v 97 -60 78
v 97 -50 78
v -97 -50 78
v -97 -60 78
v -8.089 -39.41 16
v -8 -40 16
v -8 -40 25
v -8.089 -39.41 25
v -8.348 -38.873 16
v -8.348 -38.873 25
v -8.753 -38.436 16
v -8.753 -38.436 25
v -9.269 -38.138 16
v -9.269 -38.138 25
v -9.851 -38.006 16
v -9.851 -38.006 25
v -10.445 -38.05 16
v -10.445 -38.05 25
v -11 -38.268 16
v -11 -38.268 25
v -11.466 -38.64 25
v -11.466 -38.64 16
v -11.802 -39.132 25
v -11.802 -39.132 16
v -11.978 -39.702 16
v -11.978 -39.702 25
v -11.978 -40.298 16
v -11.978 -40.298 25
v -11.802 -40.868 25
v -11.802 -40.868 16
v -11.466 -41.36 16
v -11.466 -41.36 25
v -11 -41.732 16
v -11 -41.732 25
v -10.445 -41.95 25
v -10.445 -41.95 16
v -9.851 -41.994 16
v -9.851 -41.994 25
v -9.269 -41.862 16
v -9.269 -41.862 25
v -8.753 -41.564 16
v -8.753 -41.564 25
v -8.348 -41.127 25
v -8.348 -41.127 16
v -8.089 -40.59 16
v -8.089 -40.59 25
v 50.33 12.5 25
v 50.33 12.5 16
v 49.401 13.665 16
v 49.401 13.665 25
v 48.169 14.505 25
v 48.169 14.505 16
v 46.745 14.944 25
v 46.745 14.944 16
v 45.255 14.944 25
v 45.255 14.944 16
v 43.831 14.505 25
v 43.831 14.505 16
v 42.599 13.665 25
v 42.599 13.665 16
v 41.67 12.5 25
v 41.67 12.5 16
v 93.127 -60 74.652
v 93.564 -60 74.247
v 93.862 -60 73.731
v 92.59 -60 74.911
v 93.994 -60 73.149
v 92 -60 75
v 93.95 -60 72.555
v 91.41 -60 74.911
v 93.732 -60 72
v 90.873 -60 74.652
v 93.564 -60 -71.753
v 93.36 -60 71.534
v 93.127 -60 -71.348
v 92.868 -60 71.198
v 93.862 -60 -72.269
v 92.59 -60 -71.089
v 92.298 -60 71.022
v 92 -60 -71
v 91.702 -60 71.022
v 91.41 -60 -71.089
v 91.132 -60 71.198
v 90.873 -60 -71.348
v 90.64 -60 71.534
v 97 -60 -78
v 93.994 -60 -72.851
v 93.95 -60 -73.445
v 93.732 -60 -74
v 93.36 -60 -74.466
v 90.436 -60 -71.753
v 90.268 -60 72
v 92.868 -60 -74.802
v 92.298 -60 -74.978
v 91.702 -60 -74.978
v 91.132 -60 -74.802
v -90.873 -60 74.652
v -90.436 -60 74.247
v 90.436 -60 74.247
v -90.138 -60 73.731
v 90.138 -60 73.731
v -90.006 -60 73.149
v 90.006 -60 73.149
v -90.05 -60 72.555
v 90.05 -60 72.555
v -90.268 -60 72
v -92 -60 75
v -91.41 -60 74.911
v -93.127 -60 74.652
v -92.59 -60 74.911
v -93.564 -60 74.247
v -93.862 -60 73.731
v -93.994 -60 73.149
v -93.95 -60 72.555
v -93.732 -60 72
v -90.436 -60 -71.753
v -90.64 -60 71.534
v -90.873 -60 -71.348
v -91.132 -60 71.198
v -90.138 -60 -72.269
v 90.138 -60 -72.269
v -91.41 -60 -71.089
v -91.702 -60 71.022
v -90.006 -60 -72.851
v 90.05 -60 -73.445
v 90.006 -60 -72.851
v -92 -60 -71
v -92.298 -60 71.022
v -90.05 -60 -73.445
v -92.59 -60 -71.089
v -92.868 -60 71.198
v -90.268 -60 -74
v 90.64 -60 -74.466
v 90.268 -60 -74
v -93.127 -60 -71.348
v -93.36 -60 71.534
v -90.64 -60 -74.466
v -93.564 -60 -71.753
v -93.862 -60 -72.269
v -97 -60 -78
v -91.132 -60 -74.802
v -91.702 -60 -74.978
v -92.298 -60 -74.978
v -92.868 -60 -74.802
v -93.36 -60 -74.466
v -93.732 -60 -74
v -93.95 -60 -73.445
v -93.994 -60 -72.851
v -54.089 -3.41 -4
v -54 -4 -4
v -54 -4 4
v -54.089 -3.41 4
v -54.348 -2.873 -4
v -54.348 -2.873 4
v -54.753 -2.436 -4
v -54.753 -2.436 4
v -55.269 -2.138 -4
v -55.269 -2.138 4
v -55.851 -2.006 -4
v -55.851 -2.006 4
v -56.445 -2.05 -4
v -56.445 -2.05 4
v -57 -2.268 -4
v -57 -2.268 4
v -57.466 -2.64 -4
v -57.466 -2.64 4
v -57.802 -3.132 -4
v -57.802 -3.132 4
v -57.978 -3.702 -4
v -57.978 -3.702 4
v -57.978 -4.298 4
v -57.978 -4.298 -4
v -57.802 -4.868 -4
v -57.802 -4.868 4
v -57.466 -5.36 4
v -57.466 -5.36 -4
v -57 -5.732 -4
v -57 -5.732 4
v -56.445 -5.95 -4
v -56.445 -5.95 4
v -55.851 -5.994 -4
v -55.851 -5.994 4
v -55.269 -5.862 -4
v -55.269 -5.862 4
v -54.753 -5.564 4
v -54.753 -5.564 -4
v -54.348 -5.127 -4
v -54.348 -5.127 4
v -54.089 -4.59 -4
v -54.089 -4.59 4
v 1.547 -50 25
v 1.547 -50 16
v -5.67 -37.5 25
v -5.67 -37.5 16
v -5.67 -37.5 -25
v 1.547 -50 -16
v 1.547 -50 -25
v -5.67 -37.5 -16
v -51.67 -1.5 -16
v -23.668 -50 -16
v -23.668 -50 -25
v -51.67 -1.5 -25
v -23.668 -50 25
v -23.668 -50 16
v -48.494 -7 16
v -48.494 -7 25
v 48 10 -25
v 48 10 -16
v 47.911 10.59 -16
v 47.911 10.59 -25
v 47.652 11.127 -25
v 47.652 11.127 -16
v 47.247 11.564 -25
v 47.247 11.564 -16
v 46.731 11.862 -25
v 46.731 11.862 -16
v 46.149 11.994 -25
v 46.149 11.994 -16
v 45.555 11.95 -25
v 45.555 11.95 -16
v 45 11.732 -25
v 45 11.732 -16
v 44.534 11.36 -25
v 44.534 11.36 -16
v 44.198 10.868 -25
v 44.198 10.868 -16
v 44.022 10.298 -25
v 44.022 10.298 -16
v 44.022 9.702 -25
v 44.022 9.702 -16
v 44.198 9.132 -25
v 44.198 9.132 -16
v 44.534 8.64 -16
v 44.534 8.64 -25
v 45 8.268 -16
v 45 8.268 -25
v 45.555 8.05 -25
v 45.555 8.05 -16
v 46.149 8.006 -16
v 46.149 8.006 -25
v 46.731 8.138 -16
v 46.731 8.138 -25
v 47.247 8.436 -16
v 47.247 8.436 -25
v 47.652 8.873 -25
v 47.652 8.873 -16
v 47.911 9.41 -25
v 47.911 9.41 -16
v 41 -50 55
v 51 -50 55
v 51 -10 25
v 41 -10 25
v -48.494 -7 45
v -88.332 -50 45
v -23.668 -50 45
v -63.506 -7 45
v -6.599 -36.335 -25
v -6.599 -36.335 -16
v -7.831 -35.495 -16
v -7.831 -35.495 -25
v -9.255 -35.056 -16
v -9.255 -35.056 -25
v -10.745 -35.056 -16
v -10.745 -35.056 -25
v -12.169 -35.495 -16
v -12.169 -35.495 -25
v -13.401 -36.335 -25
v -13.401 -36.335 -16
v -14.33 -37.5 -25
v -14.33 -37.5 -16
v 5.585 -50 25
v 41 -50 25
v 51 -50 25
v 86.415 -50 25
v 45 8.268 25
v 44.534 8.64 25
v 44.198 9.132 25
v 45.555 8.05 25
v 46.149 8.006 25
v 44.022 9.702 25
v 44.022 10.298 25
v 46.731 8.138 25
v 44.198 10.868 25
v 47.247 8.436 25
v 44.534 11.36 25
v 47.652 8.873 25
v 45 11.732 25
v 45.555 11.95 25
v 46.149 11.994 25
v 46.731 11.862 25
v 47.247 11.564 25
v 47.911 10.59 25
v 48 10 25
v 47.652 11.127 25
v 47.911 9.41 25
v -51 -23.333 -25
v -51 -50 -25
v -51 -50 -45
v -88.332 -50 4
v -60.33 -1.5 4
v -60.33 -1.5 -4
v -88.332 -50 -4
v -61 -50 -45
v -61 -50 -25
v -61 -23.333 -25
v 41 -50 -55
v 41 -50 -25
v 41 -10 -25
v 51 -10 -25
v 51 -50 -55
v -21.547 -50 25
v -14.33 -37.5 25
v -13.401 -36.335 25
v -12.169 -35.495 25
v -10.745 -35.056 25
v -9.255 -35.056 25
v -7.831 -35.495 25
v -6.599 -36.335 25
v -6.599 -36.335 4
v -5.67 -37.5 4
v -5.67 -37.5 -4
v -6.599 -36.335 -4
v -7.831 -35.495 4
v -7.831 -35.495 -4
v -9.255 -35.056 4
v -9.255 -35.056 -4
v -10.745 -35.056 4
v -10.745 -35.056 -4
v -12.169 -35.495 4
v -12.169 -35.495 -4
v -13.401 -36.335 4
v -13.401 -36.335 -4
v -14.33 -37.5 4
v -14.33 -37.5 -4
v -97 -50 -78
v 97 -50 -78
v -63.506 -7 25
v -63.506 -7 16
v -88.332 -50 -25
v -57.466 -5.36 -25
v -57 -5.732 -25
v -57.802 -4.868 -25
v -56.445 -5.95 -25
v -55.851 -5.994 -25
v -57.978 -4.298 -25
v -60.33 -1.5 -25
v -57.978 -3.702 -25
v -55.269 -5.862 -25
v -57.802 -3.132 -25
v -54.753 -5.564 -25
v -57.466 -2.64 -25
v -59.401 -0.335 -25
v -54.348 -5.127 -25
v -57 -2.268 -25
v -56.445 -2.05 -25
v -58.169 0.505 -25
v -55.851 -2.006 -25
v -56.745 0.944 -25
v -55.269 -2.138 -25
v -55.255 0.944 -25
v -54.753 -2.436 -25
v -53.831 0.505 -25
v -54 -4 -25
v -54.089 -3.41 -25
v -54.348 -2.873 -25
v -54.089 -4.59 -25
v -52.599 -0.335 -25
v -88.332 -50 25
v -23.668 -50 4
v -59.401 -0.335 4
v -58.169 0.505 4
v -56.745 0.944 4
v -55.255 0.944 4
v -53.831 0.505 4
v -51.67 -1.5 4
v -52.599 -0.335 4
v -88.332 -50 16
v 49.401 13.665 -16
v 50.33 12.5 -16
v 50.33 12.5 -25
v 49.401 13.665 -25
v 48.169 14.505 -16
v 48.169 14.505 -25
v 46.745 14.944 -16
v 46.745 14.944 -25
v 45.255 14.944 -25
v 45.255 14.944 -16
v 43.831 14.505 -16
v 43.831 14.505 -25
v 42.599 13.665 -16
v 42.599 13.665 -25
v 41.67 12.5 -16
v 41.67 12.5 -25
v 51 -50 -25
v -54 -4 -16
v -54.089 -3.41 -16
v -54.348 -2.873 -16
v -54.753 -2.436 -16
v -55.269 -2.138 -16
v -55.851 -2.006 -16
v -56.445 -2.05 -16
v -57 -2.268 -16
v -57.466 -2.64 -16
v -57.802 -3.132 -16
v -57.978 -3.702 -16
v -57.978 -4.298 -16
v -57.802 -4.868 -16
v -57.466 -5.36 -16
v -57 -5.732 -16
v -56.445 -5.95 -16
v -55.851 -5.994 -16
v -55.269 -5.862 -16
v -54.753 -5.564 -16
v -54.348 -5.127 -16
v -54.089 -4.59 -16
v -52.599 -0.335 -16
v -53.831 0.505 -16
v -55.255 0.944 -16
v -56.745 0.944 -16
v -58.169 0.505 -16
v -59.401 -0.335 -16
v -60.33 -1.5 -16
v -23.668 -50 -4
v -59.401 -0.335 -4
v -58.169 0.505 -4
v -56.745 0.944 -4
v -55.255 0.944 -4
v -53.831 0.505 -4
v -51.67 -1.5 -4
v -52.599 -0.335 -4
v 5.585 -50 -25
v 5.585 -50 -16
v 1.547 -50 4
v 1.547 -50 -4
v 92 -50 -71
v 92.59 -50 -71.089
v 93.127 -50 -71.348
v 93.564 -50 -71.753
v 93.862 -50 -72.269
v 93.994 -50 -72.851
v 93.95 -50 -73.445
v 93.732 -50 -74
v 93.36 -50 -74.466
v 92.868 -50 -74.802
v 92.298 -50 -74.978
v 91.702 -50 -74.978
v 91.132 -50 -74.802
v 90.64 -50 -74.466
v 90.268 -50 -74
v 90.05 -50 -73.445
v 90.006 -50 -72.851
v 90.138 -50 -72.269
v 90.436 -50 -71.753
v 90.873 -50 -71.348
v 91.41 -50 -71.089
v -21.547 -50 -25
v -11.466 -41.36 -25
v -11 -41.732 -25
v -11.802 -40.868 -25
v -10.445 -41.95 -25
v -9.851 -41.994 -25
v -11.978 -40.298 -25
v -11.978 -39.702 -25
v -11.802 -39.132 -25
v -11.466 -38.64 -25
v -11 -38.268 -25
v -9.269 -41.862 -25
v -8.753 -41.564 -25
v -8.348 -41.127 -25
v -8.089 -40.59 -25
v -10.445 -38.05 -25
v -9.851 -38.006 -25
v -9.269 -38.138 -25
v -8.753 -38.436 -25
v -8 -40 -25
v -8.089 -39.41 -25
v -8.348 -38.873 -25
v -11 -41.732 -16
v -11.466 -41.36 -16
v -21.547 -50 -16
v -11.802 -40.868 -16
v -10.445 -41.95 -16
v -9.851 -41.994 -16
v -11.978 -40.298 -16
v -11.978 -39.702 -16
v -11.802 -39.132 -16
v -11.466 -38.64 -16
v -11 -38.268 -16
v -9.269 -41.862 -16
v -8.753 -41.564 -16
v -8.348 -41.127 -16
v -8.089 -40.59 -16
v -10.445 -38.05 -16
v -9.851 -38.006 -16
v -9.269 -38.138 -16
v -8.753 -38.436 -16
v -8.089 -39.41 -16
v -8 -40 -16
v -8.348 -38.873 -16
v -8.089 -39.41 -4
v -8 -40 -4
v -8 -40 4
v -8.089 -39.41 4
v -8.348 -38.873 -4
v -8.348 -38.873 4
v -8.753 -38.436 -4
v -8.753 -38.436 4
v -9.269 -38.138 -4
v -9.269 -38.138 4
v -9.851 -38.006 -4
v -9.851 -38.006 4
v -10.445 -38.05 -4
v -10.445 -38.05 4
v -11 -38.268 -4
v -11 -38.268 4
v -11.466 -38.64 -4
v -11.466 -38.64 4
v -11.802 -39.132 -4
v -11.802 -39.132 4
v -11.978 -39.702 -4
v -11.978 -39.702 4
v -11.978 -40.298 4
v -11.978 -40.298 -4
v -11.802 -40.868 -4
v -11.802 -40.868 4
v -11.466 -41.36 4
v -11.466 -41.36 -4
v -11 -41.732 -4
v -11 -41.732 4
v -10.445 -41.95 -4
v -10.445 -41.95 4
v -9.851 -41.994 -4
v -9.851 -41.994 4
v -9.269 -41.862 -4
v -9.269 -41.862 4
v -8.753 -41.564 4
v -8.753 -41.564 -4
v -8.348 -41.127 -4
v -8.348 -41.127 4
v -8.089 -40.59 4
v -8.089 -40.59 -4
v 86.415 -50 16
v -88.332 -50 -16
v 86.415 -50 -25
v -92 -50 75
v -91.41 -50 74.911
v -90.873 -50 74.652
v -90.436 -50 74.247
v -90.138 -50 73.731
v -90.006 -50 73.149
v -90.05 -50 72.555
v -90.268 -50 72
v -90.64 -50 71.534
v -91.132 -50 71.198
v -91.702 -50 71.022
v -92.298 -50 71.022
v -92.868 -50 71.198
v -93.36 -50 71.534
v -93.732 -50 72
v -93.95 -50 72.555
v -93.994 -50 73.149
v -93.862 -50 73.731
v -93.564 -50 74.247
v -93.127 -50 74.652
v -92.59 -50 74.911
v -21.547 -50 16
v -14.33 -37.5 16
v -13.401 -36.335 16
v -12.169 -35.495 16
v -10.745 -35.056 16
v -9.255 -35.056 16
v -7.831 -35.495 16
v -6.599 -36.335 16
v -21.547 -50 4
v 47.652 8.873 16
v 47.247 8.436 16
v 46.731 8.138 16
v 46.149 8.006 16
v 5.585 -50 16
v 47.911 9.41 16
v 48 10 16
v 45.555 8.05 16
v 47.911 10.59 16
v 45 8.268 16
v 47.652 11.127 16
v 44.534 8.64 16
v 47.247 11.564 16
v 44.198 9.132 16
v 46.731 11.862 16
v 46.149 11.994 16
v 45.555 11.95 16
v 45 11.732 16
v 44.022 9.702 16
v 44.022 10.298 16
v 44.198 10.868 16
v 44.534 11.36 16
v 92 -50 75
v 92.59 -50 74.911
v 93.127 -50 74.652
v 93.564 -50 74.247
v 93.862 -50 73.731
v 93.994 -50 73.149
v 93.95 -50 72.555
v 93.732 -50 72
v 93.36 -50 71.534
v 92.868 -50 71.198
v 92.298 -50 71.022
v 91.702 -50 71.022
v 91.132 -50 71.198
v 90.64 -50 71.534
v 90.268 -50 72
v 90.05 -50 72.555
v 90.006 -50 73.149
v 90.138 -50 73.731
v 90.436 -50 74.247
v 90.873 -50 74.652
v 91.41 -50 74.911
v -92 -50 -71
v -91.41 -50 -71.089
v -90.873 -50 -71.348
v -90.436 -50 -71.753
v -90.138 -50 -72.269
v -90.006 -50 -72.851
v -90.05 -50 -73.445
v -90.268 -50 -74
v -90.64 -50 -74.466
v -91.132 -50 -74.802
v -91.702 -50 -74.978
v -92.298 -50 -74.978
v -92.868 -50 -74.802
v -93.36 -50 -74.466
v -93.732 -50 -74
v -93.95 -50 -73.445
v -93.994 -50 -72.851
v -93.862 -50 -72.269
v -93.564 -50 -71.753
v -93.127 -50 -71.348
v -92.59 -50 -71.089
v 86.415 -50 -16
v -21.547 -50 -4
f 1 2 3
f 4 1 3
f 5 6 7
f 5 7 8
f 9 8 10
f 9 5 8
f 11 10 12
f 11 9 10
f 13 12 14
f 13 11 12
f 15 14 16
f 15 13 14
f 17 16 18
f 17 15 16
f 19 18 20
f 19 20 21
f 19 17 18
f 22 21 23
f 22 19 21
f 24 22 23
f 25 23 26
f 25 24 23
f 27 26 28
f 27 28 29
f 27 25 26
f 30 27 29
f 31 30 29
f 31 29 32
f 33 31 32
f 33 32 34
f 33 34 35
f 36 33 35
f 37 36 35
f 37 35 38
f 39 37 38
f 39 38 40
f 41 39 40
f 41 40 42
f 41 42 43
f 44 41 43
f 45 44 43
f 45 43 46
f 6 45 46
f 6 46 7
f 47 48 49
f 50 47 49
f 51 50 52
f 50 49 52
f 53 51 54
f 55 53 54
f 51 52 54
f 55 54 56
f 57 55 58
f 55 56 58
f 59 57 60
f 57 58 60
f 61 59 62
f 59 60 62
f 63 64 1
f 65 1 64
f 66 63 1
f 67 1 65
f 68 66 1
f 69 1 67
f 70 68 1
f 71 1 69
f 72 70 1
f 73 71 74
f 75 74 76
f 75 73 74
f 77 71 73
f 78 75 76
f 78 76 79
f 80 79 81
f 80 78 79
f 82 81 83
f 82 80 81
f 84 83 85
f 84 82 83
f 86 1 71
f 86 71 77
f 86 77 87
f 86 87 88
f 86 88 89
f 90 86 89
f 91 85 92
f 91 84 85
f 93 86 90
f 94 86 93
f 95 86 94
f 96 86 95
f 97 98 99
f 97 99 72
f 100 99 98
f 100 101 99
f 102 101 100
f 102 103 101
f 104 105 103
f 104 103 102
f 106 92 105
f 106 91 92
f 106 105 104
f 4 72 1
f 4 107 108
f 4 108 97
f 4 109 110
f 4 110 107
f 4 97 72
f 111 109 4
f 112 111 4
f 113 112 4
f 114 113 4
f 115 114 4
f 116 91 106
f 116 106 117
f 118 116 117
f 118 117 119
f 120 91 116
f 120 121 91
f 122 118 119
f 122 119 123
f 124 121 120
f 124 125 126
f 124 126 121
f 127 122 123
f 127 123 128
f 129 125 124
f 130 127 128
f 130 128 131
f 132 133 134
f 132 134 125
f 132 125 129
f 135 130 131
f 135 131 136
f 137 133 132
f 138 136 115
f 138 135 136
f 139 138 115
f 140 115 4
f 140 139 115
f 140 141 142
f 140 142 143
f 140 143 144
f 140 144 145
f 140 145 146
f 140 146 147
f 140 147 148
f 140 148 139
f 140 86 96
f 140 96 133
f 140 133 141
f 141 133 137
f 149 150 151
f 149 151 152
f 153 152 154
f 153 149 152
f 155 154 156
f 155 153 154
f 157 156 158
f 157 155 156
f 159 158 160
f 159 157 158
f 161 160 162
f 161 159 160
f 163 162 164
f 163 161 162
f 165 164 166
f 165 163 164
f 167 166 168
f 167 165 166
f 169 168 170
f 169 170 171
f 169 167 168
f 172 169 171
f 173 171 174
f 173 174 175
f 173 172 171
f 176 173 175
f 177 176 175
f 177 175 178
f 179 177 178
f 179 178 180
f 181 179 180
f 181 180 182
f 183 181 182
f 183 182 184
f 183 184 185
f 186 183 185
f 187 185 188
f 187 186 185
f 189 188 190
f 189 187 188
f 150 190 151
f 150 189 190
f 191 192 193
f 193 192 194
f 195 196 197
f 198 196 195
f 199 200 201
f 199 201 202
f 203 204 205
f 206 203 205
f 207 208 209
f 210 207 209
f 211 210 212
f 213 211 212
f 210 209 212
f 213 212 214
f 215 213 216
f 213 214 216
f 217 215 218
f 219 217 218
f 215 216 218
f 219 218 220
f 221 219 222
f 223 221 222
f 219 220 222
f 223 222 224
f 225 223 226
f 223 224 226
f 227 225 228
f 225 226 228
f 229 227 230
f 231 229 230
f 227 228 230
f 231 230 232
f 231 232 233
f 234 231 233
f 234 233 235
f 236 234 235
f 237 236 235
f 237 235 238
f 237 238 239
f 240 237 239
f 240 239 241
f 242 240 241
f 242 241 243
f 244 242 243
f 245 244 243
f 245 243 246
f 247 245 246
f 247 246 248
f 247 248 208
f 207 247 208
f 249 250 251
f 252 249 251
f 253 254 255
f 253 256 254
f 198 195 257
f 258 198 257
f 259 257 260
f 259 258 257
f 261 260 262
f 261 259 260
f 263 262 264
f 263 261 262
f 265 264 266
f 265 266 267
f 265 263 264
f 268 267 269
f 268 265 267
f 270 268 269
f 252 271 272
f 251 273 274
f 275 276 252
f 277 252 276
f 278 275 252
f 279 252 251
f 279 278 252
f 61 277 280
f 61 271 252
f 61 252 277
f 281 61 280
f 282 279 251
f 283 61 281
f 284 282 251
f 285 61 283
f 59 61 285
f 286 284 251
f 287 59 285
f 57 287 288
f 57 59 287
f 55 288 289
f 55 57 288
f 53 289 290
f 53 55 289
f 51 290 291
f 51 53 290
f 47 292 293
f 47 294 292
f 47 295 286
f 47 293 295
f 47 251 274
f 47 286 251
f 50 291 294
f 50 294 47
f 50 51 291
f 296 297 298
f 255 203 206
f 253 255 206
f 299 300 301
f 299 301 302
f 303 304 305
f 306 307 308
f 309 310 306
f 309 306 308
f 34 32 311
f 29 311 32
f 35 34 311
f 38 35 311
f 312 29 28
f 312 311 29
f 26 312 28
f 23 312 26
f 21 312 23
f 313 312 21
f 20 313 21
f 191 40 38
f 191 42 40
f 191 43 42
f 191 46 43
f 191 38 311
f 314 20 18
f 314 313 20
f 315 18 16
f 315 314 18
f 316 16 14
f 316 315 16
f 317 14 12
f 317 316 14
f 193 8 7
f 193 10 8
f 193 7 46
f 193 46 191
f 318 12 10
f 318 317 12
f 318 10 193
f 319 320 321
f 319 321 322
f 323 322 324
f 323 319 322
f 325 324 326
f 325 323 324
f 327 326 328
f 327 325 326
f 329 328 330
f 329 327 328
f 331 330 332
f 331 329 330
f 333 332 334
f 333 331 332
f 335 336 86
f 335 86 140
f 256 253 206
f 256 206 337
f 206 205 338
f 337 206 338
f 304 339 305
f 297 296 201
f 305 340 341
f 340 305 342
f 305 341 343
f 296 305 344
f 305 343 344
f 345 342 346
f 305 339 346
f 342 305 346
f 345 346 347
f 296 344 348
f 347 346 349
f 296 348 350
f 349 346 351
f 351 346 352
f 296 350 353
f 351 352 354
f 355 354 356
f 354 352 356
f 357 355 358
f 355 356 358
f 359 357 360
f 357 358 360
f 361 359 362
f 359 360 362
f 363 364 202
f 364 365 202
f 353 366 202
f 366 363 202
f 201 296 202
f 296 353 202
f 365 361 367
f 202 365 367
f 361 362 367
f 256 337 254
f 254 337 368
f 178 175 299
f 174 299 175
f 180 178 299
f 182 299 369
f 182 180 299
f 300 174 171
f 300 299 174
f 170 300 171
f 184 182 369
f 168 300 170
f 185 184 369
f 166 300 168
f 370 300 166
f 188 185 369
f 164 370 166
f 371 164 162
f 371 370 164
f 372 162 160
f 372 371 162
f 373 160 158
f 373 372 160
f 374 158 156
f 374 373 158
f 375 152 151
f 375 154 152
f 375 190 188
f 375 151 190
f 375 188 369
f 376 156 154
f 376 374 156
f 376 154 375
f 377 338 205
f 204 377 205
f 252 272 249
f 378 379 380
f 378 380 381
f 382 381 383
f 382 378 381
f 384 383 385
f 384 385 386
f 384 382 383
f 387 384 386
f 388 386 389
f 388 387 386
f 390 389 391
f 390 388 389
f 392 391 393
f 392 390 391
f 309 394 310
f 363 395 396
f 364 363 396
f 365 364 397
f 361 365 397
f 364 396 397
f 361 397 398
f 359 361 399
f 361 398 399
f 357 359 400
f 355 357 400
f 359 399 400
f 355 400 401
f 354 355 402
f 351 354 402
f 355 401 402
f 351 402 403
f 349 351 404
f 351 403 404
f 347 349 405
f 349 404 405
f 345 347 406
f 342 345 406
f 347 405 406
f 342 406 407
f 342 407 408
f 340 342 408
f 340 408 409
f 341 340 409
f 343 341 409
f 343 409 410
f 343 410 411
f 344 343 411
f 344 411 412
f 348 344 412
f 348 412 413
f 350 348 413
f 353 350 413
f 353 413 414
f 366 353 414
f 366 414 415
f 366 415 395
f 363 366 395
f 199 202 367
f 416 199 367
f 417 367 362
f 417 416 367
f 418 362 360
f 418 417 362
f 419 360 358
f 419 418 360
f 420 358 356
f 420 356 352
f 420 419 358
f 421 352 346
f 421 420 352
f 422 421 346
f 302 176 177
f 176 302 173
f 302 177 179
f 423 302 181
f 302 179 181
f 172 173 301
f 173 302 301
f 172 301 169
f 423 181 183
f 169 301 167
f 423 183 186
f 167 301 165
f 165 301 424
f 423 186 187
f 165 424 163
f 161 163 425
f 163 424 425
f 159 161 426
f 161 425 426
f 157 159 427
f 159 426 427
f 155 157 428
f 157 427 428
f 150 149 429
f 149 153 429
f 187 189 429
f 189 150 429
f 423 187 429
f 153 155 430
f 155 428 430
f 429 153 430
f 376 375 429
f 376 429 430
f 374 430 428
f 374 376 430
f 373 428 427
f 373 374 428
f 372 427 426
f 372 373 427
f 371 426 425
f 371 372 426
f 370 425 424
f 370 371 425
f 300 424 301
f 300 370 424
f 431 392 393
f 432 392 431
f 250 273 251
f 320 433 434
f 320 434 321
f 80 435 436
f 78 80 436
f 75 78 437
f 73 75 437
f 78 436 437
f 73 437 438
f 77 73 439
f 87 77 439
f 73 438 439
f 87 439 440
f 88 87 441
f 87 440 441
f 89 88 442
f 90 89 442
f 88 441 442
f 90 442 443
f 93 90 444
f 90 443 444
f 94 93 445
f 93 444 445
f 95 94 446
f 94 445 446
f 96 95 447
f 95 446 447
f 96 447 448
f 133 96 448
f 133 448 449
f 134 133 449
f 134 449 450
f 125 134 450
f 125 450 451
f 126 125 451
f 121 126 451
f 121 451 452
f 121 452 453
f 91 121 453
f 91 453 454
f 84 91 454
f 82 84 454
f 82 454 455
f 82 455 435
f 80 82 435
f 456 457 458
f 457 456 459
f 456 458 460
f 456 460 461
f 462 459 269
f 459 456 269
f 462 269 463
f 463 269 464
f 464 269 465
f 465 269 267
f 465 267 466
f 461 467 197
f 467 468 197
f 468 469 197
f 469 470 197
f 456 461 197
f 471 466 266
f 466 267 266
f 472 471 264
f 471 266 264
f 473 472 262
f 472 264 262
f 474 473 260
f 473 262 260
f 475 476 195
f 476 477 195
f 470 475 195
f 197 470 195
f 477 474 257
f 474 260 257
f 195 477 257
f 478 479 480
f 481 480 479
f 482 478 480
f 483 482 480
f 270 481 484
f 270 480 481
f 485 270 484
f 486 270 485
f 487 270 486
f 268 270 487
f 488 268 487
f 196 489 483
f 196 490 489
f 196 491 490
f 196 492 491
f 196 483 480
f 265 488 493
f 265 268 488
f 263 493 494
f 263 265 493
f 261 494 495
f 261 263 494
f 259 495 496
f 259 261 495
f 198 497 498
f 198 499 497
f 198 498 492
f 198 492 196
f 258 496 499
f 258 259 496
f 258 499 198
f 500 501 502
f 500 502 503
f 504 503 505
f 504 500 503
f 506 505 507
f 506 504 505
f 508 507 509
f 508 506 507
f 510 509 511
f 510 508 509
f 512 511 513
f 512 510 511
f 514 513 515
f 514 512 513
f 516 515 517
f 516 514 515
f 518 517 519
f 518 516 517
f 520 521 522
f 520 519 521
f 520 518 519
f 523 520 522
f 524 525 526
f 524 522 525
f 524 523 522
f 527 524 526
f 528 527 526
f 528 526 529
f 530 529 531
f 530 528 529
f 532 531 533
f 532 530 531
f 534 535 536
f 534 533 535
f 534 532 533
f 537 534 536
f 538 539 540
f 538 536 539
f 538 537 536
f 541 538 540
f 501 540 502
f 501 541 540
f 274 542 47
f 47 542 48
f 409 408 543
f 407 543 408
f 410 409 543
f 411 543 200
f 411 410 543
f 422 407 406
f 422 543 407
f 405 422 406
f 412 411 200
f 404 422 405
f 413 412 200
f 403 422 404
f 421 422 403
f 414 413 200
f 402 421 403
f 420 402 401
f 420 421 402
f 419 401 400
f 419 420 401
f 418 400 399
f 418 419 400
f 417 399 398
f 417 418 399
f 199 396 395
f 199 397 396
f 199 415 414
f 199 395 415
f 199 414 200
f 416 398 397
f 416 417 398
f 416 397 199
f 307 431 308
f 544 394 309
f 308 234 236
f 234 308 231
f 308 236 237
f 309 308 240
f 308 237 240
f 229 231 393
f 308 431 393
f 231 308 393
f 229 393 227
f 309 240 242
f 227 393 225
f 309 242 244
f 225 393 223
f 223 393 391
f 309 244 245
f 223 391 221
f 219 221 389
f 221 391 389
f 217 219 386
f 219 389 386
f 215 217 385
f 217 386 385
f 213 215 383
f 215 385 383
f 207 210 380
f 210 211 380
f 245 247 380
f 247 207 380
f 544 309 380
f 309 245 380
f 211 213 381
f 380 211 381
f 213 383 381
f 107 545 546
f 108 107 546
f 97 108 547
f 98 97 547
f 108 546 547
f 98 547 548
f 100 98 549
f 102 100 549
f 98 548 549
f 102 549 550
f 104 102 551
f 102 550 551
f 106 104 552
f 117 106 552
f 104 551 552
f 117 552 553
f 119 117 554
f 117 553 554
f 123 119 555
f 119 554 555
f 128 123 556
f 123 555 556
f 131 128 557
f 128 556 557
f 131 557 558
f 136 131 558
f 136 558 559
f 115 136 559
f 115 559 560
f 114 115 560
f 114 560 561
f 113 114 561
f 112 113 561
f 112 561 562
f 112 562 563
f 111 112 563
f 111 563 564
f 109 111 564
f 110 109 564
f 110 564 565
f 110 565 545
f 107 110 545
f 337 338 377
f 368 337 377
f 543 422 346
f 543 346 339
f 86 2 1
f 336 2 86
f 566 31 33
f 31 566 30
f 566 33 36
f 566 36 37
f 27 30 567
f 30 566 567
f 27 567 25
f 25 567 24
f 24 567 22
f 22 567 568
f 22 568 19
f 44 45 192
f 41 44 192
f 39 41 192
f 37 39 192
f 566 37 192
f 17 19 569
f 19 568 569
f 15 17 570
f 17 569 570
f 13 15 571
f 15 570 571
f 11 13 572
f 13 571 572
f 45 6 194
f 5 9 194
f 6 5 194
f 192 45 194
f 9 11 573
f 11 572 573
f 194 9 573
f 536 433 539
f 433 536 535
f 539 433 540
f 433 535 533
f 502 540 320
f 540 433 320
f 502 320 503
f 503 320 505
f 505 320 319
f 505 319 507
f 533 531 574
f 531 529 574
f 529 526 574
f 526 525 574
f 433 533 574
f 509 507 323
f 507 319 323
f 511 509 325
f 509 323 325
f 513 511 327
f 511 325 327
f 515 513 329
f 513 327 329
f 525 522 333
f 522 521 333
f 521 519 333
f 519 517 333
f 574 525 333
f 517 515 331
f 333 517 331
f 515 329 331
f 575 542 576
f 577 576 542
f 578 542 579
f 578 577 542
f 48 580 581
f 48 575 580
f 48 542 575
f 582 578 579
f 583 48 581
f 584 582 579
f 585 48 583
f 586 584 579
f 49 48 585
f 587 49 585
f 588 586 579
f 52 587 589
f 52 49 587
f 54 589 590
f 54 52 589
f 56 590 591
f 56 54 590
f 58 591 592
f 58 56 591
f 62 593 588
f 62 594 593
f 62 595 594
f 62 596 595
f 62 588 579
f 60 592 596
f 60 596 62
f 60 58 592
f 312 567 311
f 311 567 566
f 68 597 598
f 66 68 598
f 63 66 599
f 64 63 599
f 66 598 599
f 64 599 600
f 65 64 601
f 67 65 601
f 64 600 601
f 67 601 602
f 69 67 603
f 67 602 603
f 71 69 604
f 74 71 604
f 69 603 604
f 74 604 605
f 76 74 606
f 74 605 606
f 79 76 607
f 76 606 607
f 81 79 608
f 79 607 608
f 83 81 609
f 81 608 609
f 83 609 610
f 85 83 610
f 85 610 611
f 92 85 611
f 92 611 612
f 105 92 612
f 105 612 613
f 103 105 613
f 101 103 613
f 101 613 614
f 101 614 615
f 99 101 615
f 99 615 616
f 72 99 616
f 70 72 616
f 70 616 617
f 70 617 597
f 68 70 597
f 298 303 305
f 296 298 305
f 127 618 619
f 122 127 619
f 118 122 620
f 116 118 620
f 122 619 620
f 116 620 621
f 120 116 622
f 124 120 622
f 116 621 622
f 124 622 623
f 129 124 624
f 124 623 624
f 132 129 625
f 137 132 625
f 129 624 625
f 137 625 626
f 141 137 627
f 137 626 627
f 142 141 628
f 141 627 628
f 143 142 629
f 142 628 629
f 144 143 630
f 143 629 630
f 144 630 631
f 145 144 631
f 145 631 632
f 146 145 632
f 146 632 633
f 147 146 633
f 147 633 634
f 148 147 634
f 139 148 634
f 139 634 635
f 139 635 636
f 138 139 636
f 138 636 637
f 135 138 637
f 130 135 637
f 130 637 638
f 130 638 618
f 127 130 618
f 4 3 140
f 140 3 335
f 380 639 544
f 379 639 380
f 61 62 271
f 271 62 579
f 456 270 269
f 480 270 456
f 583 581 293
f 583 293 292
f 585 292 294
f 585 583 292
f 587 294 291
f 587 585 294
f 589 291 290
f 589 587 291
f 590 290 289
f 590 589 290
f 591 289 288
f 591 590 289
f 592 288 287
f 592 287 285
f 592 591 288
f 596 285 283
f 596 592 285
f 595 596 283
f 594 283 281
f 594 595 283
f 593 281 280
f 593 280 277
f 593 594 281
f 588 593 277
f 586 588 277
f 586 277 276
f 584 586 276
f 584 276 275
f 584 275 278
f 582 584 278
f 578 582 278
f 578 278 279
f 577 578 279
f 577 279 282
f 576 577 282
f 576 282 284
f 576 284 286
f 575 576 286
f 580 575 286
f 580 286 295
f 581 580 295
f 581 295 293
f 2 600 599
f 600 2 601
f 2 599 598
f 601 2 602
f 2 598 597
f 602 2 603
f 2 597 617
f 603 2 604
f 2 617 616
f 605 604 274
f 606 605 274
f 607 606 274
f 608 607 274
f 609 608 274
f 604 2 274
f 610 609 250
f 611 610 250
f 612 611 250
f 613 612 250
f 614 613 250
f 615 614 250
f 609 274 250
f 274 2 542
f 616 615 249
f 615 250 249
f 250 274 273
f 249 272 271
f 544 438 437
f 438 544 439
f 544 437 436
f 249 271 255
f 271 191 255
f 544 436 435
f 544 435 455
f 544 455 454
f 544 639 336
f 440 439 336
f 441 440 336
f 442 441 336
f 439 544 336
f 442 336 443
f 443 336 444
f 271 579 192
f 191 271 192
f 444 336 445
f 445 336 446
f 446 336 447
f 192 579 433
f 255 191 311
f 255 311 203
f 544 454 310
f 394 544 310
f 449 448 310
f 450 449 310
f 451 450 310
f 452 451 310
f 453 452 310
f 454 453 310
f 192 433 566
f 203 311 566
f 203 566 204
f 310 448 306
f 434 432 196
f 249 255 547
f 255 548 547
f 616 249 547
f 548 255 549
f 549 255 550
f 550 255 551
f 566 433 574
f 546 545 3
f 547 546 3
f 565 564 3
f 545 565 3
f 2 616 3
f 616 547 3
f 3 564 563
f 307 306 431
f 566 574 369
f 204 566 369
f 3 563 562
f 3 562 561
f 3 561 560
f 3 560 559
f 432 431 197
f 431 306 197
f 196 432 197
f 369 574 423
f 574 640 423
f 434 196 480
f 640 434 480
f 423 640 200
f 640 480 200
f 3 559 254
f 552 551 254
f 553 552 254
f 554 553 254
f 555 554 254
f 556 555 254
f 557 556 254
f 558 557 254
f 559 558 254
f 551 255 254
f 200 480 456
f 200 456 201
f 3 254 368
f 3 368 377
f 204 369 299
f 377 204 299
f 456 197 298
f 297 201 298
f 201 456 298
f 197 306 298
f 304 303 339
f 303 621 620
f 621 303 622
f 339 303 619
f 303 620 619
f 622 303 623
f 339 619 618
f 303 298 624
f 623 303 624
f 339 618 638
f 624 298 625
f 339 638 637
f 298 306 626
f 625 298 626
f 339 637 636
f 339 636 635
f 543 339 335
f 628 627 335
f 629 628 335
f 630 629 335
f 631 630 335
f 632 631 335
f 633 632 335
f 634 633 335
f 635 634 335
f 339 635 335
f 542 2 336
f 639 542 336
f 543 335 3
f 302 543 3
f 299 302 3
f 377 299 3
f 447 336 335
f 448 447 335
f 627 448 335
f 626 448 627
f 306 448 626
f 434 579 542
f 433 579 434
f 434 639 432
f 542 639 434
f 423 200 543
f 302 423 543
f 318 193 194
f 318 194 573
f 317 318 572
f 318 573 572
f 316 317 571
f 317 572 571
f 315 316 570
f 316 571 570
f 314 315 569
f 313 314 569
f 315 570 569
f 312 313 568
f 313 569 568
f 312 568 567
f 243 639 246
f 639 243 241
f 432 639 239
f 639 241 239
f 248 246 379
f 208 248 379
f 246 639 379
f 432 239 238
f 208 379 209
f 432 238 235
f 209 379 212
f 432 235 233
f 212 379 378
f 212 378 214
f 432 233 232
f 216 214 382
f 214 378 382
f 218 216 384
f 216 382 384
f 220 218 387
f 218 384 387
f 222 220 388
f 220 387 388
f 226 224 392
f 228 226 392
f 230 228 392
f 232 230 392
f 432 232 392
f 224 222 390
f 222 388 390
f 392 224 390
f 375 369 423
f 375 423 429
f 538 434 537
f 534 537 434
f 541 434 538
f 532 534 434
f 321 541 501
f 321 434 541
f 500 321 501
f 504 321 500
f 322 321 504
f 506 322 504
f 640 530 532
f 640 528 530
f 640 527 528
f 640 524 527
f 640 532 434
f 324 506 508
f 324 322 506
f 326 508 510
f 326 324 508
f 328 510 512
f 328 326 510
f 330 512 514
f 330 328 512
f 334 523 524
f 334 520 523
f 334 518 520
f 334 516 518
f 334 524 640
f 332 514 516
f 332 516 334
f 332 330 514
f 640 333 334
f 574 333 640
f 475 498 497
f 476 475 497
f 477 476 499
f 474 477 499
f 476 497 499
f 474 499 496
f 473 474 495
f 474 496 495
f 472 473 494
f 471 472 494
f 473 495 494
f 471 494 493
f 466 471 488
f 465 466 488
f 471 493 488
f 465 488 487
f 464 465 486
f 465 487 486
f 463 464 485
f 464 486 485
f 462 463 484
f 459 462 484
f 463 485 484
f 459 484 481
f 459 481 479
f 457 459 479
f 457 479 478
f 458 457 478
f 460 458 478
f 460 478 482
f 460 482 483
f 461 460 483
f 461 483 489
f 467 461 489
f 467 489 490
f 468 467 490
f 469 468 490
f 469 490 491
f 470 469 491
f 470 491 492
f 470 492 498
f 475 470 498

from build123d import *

# Parameters (mm, degrees)
SKETCH2_R             = 2
BOSS_EXTRUDE2_DEPTH   = 5
BOSS_EXTRUDE2_2_DEPTH = 5
BOSS_EXTRUDE2_3_DEPTH = 5
SKETCH3_W             = 194
SKETCH3_H             = 156
BOSS_EXTRUDE3_DEPTH   = 10
SKETCH5_R             = 2
BOSS_EXTRUDE4_DEPTH   = 10
SKETCH6_W             = 80.829037686
SKETCH6_H             = 10
CUT_EXTRUDE1_DEPTH    = 142
SKETCH7_R             = 2
CUT_EXTRUDE2_DEPTH    = 142
CUT_EXTRUDE4_DEPTH    = 10
BOSS_EXTRUDE5_DEPTH   = 20
SKETCH10_R            = 2
CUT_EXTRUDE5_DEPTH    = 1
CUT_EXTRUDE6_DEPTH    = 1
BOSS_EXTRUDE6_DEPTH   = 5
BOSS_EXTRUDE7_DEPTH   = 5


with BuildPart() as part:
    # Sketch2 → Boss-Extrude2 (new, symmetric)
    with BuildSketch(Plane.XY):
        with BuildLine():
            ThreePointArc((50.330127019, 12.5), (46, 15), (41.669872981, 12.5))
            Line((41.669872981, 12.5), (5.585481157, -50))
            Line((5.585481157, -50), (86.414518843, -50))
            Line((86.414518843, -50), (50.330127019, 12.5))
        make_face()
        with Locations((46, 10)):
            Circle(SKETCH2_R, mode=Mode.SUBTRACT)
    extrude(amount=BOSS_EXTRUDE2_DEPTH, both=True)



with BuildPart() as body_2:
    # Sketch2 → Boss-Extrude2 2 (new, symmetric)
    with BuildSketch(Plane.XY):
        with BuildLine():
            Line((-21.547005384, -50), (1.547005384, -50))
            Line((1.547005384, -50), (-5.669872981, -37.5))
            ThreePointArc((-5.669872981, -37.5), (-10, -35), (-14.330127019, -37.5))
            Line((-14.330127019, -37.5), (-21.547005384, -50))
        make_face()
        with Locations((-10, -40)):
            Circle(SKETCH2_R, mode=Mode.SUBTRACT)
    extrude(amount=BOSS_EXTRUDE2_2_DEPTH, both=True)


with BuildPart() as body_3:
    # Sketch2 → Boss-Extrude2 3 (new, symmetric)
    with BuildSketch(Plane.XY):
        with BuildLine():
            Line((-88.331615075, -50), (-23.668384925, -50))
            Line((-23.668384925, -50), (-51.669872981, -1.5))
            ThreePointArc((-51.669872981, -1.5), (-56, 1), (-60.330127019, -1.5))
            Line((-60.330127019, -1.5), (-88.331615075, -50))
        make_face()
        with Locations((-56, -4)):
            Circle(SKETCH2_R, mode=Mode.SUBTRACT)
    extrude(amount=BOSS_EXTRUDE2_3_DEPTH, both=True)


with BuildPart() as part_1:
    add(part.part)

    add(body_2.part)  # Boss-Extrude3 merges body 2

    add(body_3.part)  # Boss-Extrude3 merges body 3
    # Sketch3 → Boss-Extrude3 (add)
    with BuildSketch(Plane(origin=(0, -50, 0), x_dir=(-1, 0, 0), z_dir=(0, -1, 0))):
        Rectangle(SKETCH3_W, SKETCH3_H)
    extrude(amount=BOSS_EXTRUDE3_DEPTH)

    # Sketch5 → Boss-Extrude4 (add)
    # profile 1 of 3: a face of its own
    with BuildSketch(Plane.XY.offset(15)):
        with BuildLine():
            ThreePointArc((50.330127019, 12.5), (46, 15), (41.669872981, 12.5))
            Line((41.669872981, 12.5), (5.585481157, -50))
            Line((5.585481157, -50), (86.414518843, -50))
            Line((86.414518843, -50), (50.330127019, 12.5))
        make_face()
        with Locations((46, 10)):
            Circle(SKETCH5_R, mode=Mode.SUBTRACT)
    # profile 2 of 3: a face of its own
    with BuildSketch(Plane.XY.offset(15)):
        with BuildLine():
            Line((-21.547005384, -50), (1.547005384, -50))
            Line((1.547005384, -50), (-5.669872981, -37.5))
            ThreePointArc((-5.669872981, -37.5), (-10, -35), (-14.330127019, -37.5))
            Line((-14.330127019, -37.5), (-21.547005384, -50))
        make_face()
        with Locations((-10, -40)):
            Circle(SKETCH5_R, mode=Mode.SUBTRACT)
    # profile 3 of 3: a face of its own
    with BuildSketch(Plane.XY.offset(15)):
        with BuildLine():
            Line((-88.331615075, -50), (-23.668384925, -50))
            Line((-23.668384925, -50), (-51.669872981, -1.5))
            ThreePointArc((-51.669872981, -1.5), (-56, 1), (-60.330127019, -1.5))
            Line((-60.330127019, -1.5), (-88.331615075, -50))
        make_face()
        with Locations((-56, -4)):
            Circle(SKETCH5_R, mode=Mode.SUBTRACT)
    boss_extrude4 = extrude(amount=BOSS_EXTRUDE4_DEPTH)

    # Mirror1: Boss-Extrude4 across plane
    add(boss_extrude4.mirror(Plane.XY))

    # Sketch6 → Cut-Extrude1 (cut)
    with BuildSketch(Plane(origin=(0, -50, 0), x_dir=(1, 0, 0), z_dir=(0, 1, 0))):
        with Locations((46, 0)):
            Rectangle(SKETCH6_W, SKETCH6_H)
    extrude(amount=CUT_EXTRUDE1_DEPTH, mode=Mode.SUBTRACT)

    # Sketch7 → Cut-Extrude2 (cut)
    with BuildSketch(Plane(origin=(0, -50, 0), x_dir=(1, 0, 0), z_dir=(0, 1, 0))):
        with Locations((-92, -73)):
            Circle(SKETCH7_R)
        with Locations((-92, 73)):
            Circle(SKETCH7_R)
        with Locations((92, 73)):
            Circle(SKETCH7_R)
        with Locations((92, -73)):
            Circle(SKETCH7_R)
    extrude(amount=-CUT_EXTRUDE2_DEPTH, mode=Mode.SUBTRACT)

    # Sketch8 → Cut-Extrude4 (cut)
    with BuildSketch(Plane.XY.offset(25)):
        Polygon((-71, -7), (-41, -7), (-41, -1), (-41, 3.028567104), (-71, 3.028567104), (-71, -1), align=None)
    extrude(amount=-CUT_EXTRUDE4_DEPTH, mode=Mode.SUBTRACT)

    # Sketch9 → Boss-Extrude5 (add)
    with BuildSketch(Plane.XY.offset(25)):
        Polygon((-88.331615075, -50), (-23.668384925, -50), (-48.494446501, -7), (-63.505553499, -7), align=None)
    extrude(amount=BOSS_EXTRUDE5_DEPTH)

    # Sketch10 → Cut-Extrude5 (cut)
    # profile 1 of 2: a face of its own
    with BuildSketch(Plane.XY.offset(5)):
        with BuildLine():
            Line((-60.330127019, -1.5), (-88.331615075, -50))
            Line((-88.331615075, -50), (-23.668384925, -50))
            Line((-23.668384925, -50), (-51.669872981, -1.5))
            ThreePointArc((-51.669872981, -1.5), (-56, 1), (-60.330127019, -1.5))
        make_face()
        with Locations((-56, -4)):
            Circle(SKETCH10_R, mode=Mode.SUBTRACT)
    # profile 2 of 2: a face of its own
    with BuildSketch(Plane.XY.offset(5)):
        with BuildLine():
            Line((-21.547005384, -50), (-14.330127019, -37.5))
            ThreePointArc((-14.330127019, -37.5), (-10, -35), (-5.669872981, -37.5))
            Line((-5.669872981, -37.5), (1.547005384, -50))
            Line((1.547005384, -50), (-21.547005384, -50))
        make_face()
    cut_extrude5 = extrude(amount=-CUT_EXTRUDE5_DEPTH, mode=Mode.SUBTRACT)

    # Mirror2: Cut-Extrude5 across plane
    add(cut_extrude5.mirror(Plane.XY), mode=Mode.SUBTRACT)

    # Sketch11 → Cut-Extrude6 (cut)
    with BuildSketch(Plane.XY.offset(-15)):
        with BuildLine():
            Line((-88.331615075, -50), (-23.668384925, -50))
            Line((-23.668384925, -50), (-51.669872981, -1.5))
            ThreePointArc((-51.669872981, -1.5), (-56, 1), (-60.330127019, -1.5))
            Line((-60.330127019, -1.5), (-88.331615075, -50))
        make_face()
        with BuildLine():
            Line((-21.547005384, -50), (1.547005384, -50))
            Line((1.547005384, -50), (-5.669872981, -37.5))
            ThreePointArc((-5.669872981, -37.5), (-10, -35), (-14.330127019, -37.5))
            Line((-14.330127019, -37.5), (-21.547005384, -50))
        make_face()
        with BuildLine():
            Line((5.585481157, -50), (41.669872981, 12.5))
            ThreePointArc((41.669872981, 12.5), (46, 15), (50.330127019, 12.5))
            Line((50.330127019, 12.5), (86.414518843, -50))
            Line((86.414518843, -50), (5.585481157, -50))
        make_face()
    cut_extrude6 = extrude(amount=-CUT_EXTRUDE6_DEPTH, mode=Mode.SUBTRACT)

    # Mirror3: Cut-Extrude6 across plane
    add(cut_extrude6.mirror(Plane.XY), mode=Mode.SUBTRACT)

    # Sketch12 → Boss-Extrude6 (add, symmetric)
    with BuildSketch(Plane(origin=(46, 0, 0), x_dir=(0, 0, -1), z_dir=(1, 0, 0))):
        Polygon((-55, -50), (-25, -10), (-25, -50), align=None)
    boss_extrude6 = extrude(amount=BOSS_EXTRUDE6_DEPTH, both=True)

    # Mirror4: Boss-Extrude6 across plane
    add(boss_extrude6.mirror(Plane.XY))

    # Sketch13 → Boss-Extrude7 (add, symmetric)
    with BuildSketch(Plane.ZY.offset(56)):
        Polygon((-45, -50), (-25, -23.333333333), (-25, -50), align=None)
    extrude(amount=BOSS_EXTRUDE7_DEPTH, both=True)


solid = part_1.part
